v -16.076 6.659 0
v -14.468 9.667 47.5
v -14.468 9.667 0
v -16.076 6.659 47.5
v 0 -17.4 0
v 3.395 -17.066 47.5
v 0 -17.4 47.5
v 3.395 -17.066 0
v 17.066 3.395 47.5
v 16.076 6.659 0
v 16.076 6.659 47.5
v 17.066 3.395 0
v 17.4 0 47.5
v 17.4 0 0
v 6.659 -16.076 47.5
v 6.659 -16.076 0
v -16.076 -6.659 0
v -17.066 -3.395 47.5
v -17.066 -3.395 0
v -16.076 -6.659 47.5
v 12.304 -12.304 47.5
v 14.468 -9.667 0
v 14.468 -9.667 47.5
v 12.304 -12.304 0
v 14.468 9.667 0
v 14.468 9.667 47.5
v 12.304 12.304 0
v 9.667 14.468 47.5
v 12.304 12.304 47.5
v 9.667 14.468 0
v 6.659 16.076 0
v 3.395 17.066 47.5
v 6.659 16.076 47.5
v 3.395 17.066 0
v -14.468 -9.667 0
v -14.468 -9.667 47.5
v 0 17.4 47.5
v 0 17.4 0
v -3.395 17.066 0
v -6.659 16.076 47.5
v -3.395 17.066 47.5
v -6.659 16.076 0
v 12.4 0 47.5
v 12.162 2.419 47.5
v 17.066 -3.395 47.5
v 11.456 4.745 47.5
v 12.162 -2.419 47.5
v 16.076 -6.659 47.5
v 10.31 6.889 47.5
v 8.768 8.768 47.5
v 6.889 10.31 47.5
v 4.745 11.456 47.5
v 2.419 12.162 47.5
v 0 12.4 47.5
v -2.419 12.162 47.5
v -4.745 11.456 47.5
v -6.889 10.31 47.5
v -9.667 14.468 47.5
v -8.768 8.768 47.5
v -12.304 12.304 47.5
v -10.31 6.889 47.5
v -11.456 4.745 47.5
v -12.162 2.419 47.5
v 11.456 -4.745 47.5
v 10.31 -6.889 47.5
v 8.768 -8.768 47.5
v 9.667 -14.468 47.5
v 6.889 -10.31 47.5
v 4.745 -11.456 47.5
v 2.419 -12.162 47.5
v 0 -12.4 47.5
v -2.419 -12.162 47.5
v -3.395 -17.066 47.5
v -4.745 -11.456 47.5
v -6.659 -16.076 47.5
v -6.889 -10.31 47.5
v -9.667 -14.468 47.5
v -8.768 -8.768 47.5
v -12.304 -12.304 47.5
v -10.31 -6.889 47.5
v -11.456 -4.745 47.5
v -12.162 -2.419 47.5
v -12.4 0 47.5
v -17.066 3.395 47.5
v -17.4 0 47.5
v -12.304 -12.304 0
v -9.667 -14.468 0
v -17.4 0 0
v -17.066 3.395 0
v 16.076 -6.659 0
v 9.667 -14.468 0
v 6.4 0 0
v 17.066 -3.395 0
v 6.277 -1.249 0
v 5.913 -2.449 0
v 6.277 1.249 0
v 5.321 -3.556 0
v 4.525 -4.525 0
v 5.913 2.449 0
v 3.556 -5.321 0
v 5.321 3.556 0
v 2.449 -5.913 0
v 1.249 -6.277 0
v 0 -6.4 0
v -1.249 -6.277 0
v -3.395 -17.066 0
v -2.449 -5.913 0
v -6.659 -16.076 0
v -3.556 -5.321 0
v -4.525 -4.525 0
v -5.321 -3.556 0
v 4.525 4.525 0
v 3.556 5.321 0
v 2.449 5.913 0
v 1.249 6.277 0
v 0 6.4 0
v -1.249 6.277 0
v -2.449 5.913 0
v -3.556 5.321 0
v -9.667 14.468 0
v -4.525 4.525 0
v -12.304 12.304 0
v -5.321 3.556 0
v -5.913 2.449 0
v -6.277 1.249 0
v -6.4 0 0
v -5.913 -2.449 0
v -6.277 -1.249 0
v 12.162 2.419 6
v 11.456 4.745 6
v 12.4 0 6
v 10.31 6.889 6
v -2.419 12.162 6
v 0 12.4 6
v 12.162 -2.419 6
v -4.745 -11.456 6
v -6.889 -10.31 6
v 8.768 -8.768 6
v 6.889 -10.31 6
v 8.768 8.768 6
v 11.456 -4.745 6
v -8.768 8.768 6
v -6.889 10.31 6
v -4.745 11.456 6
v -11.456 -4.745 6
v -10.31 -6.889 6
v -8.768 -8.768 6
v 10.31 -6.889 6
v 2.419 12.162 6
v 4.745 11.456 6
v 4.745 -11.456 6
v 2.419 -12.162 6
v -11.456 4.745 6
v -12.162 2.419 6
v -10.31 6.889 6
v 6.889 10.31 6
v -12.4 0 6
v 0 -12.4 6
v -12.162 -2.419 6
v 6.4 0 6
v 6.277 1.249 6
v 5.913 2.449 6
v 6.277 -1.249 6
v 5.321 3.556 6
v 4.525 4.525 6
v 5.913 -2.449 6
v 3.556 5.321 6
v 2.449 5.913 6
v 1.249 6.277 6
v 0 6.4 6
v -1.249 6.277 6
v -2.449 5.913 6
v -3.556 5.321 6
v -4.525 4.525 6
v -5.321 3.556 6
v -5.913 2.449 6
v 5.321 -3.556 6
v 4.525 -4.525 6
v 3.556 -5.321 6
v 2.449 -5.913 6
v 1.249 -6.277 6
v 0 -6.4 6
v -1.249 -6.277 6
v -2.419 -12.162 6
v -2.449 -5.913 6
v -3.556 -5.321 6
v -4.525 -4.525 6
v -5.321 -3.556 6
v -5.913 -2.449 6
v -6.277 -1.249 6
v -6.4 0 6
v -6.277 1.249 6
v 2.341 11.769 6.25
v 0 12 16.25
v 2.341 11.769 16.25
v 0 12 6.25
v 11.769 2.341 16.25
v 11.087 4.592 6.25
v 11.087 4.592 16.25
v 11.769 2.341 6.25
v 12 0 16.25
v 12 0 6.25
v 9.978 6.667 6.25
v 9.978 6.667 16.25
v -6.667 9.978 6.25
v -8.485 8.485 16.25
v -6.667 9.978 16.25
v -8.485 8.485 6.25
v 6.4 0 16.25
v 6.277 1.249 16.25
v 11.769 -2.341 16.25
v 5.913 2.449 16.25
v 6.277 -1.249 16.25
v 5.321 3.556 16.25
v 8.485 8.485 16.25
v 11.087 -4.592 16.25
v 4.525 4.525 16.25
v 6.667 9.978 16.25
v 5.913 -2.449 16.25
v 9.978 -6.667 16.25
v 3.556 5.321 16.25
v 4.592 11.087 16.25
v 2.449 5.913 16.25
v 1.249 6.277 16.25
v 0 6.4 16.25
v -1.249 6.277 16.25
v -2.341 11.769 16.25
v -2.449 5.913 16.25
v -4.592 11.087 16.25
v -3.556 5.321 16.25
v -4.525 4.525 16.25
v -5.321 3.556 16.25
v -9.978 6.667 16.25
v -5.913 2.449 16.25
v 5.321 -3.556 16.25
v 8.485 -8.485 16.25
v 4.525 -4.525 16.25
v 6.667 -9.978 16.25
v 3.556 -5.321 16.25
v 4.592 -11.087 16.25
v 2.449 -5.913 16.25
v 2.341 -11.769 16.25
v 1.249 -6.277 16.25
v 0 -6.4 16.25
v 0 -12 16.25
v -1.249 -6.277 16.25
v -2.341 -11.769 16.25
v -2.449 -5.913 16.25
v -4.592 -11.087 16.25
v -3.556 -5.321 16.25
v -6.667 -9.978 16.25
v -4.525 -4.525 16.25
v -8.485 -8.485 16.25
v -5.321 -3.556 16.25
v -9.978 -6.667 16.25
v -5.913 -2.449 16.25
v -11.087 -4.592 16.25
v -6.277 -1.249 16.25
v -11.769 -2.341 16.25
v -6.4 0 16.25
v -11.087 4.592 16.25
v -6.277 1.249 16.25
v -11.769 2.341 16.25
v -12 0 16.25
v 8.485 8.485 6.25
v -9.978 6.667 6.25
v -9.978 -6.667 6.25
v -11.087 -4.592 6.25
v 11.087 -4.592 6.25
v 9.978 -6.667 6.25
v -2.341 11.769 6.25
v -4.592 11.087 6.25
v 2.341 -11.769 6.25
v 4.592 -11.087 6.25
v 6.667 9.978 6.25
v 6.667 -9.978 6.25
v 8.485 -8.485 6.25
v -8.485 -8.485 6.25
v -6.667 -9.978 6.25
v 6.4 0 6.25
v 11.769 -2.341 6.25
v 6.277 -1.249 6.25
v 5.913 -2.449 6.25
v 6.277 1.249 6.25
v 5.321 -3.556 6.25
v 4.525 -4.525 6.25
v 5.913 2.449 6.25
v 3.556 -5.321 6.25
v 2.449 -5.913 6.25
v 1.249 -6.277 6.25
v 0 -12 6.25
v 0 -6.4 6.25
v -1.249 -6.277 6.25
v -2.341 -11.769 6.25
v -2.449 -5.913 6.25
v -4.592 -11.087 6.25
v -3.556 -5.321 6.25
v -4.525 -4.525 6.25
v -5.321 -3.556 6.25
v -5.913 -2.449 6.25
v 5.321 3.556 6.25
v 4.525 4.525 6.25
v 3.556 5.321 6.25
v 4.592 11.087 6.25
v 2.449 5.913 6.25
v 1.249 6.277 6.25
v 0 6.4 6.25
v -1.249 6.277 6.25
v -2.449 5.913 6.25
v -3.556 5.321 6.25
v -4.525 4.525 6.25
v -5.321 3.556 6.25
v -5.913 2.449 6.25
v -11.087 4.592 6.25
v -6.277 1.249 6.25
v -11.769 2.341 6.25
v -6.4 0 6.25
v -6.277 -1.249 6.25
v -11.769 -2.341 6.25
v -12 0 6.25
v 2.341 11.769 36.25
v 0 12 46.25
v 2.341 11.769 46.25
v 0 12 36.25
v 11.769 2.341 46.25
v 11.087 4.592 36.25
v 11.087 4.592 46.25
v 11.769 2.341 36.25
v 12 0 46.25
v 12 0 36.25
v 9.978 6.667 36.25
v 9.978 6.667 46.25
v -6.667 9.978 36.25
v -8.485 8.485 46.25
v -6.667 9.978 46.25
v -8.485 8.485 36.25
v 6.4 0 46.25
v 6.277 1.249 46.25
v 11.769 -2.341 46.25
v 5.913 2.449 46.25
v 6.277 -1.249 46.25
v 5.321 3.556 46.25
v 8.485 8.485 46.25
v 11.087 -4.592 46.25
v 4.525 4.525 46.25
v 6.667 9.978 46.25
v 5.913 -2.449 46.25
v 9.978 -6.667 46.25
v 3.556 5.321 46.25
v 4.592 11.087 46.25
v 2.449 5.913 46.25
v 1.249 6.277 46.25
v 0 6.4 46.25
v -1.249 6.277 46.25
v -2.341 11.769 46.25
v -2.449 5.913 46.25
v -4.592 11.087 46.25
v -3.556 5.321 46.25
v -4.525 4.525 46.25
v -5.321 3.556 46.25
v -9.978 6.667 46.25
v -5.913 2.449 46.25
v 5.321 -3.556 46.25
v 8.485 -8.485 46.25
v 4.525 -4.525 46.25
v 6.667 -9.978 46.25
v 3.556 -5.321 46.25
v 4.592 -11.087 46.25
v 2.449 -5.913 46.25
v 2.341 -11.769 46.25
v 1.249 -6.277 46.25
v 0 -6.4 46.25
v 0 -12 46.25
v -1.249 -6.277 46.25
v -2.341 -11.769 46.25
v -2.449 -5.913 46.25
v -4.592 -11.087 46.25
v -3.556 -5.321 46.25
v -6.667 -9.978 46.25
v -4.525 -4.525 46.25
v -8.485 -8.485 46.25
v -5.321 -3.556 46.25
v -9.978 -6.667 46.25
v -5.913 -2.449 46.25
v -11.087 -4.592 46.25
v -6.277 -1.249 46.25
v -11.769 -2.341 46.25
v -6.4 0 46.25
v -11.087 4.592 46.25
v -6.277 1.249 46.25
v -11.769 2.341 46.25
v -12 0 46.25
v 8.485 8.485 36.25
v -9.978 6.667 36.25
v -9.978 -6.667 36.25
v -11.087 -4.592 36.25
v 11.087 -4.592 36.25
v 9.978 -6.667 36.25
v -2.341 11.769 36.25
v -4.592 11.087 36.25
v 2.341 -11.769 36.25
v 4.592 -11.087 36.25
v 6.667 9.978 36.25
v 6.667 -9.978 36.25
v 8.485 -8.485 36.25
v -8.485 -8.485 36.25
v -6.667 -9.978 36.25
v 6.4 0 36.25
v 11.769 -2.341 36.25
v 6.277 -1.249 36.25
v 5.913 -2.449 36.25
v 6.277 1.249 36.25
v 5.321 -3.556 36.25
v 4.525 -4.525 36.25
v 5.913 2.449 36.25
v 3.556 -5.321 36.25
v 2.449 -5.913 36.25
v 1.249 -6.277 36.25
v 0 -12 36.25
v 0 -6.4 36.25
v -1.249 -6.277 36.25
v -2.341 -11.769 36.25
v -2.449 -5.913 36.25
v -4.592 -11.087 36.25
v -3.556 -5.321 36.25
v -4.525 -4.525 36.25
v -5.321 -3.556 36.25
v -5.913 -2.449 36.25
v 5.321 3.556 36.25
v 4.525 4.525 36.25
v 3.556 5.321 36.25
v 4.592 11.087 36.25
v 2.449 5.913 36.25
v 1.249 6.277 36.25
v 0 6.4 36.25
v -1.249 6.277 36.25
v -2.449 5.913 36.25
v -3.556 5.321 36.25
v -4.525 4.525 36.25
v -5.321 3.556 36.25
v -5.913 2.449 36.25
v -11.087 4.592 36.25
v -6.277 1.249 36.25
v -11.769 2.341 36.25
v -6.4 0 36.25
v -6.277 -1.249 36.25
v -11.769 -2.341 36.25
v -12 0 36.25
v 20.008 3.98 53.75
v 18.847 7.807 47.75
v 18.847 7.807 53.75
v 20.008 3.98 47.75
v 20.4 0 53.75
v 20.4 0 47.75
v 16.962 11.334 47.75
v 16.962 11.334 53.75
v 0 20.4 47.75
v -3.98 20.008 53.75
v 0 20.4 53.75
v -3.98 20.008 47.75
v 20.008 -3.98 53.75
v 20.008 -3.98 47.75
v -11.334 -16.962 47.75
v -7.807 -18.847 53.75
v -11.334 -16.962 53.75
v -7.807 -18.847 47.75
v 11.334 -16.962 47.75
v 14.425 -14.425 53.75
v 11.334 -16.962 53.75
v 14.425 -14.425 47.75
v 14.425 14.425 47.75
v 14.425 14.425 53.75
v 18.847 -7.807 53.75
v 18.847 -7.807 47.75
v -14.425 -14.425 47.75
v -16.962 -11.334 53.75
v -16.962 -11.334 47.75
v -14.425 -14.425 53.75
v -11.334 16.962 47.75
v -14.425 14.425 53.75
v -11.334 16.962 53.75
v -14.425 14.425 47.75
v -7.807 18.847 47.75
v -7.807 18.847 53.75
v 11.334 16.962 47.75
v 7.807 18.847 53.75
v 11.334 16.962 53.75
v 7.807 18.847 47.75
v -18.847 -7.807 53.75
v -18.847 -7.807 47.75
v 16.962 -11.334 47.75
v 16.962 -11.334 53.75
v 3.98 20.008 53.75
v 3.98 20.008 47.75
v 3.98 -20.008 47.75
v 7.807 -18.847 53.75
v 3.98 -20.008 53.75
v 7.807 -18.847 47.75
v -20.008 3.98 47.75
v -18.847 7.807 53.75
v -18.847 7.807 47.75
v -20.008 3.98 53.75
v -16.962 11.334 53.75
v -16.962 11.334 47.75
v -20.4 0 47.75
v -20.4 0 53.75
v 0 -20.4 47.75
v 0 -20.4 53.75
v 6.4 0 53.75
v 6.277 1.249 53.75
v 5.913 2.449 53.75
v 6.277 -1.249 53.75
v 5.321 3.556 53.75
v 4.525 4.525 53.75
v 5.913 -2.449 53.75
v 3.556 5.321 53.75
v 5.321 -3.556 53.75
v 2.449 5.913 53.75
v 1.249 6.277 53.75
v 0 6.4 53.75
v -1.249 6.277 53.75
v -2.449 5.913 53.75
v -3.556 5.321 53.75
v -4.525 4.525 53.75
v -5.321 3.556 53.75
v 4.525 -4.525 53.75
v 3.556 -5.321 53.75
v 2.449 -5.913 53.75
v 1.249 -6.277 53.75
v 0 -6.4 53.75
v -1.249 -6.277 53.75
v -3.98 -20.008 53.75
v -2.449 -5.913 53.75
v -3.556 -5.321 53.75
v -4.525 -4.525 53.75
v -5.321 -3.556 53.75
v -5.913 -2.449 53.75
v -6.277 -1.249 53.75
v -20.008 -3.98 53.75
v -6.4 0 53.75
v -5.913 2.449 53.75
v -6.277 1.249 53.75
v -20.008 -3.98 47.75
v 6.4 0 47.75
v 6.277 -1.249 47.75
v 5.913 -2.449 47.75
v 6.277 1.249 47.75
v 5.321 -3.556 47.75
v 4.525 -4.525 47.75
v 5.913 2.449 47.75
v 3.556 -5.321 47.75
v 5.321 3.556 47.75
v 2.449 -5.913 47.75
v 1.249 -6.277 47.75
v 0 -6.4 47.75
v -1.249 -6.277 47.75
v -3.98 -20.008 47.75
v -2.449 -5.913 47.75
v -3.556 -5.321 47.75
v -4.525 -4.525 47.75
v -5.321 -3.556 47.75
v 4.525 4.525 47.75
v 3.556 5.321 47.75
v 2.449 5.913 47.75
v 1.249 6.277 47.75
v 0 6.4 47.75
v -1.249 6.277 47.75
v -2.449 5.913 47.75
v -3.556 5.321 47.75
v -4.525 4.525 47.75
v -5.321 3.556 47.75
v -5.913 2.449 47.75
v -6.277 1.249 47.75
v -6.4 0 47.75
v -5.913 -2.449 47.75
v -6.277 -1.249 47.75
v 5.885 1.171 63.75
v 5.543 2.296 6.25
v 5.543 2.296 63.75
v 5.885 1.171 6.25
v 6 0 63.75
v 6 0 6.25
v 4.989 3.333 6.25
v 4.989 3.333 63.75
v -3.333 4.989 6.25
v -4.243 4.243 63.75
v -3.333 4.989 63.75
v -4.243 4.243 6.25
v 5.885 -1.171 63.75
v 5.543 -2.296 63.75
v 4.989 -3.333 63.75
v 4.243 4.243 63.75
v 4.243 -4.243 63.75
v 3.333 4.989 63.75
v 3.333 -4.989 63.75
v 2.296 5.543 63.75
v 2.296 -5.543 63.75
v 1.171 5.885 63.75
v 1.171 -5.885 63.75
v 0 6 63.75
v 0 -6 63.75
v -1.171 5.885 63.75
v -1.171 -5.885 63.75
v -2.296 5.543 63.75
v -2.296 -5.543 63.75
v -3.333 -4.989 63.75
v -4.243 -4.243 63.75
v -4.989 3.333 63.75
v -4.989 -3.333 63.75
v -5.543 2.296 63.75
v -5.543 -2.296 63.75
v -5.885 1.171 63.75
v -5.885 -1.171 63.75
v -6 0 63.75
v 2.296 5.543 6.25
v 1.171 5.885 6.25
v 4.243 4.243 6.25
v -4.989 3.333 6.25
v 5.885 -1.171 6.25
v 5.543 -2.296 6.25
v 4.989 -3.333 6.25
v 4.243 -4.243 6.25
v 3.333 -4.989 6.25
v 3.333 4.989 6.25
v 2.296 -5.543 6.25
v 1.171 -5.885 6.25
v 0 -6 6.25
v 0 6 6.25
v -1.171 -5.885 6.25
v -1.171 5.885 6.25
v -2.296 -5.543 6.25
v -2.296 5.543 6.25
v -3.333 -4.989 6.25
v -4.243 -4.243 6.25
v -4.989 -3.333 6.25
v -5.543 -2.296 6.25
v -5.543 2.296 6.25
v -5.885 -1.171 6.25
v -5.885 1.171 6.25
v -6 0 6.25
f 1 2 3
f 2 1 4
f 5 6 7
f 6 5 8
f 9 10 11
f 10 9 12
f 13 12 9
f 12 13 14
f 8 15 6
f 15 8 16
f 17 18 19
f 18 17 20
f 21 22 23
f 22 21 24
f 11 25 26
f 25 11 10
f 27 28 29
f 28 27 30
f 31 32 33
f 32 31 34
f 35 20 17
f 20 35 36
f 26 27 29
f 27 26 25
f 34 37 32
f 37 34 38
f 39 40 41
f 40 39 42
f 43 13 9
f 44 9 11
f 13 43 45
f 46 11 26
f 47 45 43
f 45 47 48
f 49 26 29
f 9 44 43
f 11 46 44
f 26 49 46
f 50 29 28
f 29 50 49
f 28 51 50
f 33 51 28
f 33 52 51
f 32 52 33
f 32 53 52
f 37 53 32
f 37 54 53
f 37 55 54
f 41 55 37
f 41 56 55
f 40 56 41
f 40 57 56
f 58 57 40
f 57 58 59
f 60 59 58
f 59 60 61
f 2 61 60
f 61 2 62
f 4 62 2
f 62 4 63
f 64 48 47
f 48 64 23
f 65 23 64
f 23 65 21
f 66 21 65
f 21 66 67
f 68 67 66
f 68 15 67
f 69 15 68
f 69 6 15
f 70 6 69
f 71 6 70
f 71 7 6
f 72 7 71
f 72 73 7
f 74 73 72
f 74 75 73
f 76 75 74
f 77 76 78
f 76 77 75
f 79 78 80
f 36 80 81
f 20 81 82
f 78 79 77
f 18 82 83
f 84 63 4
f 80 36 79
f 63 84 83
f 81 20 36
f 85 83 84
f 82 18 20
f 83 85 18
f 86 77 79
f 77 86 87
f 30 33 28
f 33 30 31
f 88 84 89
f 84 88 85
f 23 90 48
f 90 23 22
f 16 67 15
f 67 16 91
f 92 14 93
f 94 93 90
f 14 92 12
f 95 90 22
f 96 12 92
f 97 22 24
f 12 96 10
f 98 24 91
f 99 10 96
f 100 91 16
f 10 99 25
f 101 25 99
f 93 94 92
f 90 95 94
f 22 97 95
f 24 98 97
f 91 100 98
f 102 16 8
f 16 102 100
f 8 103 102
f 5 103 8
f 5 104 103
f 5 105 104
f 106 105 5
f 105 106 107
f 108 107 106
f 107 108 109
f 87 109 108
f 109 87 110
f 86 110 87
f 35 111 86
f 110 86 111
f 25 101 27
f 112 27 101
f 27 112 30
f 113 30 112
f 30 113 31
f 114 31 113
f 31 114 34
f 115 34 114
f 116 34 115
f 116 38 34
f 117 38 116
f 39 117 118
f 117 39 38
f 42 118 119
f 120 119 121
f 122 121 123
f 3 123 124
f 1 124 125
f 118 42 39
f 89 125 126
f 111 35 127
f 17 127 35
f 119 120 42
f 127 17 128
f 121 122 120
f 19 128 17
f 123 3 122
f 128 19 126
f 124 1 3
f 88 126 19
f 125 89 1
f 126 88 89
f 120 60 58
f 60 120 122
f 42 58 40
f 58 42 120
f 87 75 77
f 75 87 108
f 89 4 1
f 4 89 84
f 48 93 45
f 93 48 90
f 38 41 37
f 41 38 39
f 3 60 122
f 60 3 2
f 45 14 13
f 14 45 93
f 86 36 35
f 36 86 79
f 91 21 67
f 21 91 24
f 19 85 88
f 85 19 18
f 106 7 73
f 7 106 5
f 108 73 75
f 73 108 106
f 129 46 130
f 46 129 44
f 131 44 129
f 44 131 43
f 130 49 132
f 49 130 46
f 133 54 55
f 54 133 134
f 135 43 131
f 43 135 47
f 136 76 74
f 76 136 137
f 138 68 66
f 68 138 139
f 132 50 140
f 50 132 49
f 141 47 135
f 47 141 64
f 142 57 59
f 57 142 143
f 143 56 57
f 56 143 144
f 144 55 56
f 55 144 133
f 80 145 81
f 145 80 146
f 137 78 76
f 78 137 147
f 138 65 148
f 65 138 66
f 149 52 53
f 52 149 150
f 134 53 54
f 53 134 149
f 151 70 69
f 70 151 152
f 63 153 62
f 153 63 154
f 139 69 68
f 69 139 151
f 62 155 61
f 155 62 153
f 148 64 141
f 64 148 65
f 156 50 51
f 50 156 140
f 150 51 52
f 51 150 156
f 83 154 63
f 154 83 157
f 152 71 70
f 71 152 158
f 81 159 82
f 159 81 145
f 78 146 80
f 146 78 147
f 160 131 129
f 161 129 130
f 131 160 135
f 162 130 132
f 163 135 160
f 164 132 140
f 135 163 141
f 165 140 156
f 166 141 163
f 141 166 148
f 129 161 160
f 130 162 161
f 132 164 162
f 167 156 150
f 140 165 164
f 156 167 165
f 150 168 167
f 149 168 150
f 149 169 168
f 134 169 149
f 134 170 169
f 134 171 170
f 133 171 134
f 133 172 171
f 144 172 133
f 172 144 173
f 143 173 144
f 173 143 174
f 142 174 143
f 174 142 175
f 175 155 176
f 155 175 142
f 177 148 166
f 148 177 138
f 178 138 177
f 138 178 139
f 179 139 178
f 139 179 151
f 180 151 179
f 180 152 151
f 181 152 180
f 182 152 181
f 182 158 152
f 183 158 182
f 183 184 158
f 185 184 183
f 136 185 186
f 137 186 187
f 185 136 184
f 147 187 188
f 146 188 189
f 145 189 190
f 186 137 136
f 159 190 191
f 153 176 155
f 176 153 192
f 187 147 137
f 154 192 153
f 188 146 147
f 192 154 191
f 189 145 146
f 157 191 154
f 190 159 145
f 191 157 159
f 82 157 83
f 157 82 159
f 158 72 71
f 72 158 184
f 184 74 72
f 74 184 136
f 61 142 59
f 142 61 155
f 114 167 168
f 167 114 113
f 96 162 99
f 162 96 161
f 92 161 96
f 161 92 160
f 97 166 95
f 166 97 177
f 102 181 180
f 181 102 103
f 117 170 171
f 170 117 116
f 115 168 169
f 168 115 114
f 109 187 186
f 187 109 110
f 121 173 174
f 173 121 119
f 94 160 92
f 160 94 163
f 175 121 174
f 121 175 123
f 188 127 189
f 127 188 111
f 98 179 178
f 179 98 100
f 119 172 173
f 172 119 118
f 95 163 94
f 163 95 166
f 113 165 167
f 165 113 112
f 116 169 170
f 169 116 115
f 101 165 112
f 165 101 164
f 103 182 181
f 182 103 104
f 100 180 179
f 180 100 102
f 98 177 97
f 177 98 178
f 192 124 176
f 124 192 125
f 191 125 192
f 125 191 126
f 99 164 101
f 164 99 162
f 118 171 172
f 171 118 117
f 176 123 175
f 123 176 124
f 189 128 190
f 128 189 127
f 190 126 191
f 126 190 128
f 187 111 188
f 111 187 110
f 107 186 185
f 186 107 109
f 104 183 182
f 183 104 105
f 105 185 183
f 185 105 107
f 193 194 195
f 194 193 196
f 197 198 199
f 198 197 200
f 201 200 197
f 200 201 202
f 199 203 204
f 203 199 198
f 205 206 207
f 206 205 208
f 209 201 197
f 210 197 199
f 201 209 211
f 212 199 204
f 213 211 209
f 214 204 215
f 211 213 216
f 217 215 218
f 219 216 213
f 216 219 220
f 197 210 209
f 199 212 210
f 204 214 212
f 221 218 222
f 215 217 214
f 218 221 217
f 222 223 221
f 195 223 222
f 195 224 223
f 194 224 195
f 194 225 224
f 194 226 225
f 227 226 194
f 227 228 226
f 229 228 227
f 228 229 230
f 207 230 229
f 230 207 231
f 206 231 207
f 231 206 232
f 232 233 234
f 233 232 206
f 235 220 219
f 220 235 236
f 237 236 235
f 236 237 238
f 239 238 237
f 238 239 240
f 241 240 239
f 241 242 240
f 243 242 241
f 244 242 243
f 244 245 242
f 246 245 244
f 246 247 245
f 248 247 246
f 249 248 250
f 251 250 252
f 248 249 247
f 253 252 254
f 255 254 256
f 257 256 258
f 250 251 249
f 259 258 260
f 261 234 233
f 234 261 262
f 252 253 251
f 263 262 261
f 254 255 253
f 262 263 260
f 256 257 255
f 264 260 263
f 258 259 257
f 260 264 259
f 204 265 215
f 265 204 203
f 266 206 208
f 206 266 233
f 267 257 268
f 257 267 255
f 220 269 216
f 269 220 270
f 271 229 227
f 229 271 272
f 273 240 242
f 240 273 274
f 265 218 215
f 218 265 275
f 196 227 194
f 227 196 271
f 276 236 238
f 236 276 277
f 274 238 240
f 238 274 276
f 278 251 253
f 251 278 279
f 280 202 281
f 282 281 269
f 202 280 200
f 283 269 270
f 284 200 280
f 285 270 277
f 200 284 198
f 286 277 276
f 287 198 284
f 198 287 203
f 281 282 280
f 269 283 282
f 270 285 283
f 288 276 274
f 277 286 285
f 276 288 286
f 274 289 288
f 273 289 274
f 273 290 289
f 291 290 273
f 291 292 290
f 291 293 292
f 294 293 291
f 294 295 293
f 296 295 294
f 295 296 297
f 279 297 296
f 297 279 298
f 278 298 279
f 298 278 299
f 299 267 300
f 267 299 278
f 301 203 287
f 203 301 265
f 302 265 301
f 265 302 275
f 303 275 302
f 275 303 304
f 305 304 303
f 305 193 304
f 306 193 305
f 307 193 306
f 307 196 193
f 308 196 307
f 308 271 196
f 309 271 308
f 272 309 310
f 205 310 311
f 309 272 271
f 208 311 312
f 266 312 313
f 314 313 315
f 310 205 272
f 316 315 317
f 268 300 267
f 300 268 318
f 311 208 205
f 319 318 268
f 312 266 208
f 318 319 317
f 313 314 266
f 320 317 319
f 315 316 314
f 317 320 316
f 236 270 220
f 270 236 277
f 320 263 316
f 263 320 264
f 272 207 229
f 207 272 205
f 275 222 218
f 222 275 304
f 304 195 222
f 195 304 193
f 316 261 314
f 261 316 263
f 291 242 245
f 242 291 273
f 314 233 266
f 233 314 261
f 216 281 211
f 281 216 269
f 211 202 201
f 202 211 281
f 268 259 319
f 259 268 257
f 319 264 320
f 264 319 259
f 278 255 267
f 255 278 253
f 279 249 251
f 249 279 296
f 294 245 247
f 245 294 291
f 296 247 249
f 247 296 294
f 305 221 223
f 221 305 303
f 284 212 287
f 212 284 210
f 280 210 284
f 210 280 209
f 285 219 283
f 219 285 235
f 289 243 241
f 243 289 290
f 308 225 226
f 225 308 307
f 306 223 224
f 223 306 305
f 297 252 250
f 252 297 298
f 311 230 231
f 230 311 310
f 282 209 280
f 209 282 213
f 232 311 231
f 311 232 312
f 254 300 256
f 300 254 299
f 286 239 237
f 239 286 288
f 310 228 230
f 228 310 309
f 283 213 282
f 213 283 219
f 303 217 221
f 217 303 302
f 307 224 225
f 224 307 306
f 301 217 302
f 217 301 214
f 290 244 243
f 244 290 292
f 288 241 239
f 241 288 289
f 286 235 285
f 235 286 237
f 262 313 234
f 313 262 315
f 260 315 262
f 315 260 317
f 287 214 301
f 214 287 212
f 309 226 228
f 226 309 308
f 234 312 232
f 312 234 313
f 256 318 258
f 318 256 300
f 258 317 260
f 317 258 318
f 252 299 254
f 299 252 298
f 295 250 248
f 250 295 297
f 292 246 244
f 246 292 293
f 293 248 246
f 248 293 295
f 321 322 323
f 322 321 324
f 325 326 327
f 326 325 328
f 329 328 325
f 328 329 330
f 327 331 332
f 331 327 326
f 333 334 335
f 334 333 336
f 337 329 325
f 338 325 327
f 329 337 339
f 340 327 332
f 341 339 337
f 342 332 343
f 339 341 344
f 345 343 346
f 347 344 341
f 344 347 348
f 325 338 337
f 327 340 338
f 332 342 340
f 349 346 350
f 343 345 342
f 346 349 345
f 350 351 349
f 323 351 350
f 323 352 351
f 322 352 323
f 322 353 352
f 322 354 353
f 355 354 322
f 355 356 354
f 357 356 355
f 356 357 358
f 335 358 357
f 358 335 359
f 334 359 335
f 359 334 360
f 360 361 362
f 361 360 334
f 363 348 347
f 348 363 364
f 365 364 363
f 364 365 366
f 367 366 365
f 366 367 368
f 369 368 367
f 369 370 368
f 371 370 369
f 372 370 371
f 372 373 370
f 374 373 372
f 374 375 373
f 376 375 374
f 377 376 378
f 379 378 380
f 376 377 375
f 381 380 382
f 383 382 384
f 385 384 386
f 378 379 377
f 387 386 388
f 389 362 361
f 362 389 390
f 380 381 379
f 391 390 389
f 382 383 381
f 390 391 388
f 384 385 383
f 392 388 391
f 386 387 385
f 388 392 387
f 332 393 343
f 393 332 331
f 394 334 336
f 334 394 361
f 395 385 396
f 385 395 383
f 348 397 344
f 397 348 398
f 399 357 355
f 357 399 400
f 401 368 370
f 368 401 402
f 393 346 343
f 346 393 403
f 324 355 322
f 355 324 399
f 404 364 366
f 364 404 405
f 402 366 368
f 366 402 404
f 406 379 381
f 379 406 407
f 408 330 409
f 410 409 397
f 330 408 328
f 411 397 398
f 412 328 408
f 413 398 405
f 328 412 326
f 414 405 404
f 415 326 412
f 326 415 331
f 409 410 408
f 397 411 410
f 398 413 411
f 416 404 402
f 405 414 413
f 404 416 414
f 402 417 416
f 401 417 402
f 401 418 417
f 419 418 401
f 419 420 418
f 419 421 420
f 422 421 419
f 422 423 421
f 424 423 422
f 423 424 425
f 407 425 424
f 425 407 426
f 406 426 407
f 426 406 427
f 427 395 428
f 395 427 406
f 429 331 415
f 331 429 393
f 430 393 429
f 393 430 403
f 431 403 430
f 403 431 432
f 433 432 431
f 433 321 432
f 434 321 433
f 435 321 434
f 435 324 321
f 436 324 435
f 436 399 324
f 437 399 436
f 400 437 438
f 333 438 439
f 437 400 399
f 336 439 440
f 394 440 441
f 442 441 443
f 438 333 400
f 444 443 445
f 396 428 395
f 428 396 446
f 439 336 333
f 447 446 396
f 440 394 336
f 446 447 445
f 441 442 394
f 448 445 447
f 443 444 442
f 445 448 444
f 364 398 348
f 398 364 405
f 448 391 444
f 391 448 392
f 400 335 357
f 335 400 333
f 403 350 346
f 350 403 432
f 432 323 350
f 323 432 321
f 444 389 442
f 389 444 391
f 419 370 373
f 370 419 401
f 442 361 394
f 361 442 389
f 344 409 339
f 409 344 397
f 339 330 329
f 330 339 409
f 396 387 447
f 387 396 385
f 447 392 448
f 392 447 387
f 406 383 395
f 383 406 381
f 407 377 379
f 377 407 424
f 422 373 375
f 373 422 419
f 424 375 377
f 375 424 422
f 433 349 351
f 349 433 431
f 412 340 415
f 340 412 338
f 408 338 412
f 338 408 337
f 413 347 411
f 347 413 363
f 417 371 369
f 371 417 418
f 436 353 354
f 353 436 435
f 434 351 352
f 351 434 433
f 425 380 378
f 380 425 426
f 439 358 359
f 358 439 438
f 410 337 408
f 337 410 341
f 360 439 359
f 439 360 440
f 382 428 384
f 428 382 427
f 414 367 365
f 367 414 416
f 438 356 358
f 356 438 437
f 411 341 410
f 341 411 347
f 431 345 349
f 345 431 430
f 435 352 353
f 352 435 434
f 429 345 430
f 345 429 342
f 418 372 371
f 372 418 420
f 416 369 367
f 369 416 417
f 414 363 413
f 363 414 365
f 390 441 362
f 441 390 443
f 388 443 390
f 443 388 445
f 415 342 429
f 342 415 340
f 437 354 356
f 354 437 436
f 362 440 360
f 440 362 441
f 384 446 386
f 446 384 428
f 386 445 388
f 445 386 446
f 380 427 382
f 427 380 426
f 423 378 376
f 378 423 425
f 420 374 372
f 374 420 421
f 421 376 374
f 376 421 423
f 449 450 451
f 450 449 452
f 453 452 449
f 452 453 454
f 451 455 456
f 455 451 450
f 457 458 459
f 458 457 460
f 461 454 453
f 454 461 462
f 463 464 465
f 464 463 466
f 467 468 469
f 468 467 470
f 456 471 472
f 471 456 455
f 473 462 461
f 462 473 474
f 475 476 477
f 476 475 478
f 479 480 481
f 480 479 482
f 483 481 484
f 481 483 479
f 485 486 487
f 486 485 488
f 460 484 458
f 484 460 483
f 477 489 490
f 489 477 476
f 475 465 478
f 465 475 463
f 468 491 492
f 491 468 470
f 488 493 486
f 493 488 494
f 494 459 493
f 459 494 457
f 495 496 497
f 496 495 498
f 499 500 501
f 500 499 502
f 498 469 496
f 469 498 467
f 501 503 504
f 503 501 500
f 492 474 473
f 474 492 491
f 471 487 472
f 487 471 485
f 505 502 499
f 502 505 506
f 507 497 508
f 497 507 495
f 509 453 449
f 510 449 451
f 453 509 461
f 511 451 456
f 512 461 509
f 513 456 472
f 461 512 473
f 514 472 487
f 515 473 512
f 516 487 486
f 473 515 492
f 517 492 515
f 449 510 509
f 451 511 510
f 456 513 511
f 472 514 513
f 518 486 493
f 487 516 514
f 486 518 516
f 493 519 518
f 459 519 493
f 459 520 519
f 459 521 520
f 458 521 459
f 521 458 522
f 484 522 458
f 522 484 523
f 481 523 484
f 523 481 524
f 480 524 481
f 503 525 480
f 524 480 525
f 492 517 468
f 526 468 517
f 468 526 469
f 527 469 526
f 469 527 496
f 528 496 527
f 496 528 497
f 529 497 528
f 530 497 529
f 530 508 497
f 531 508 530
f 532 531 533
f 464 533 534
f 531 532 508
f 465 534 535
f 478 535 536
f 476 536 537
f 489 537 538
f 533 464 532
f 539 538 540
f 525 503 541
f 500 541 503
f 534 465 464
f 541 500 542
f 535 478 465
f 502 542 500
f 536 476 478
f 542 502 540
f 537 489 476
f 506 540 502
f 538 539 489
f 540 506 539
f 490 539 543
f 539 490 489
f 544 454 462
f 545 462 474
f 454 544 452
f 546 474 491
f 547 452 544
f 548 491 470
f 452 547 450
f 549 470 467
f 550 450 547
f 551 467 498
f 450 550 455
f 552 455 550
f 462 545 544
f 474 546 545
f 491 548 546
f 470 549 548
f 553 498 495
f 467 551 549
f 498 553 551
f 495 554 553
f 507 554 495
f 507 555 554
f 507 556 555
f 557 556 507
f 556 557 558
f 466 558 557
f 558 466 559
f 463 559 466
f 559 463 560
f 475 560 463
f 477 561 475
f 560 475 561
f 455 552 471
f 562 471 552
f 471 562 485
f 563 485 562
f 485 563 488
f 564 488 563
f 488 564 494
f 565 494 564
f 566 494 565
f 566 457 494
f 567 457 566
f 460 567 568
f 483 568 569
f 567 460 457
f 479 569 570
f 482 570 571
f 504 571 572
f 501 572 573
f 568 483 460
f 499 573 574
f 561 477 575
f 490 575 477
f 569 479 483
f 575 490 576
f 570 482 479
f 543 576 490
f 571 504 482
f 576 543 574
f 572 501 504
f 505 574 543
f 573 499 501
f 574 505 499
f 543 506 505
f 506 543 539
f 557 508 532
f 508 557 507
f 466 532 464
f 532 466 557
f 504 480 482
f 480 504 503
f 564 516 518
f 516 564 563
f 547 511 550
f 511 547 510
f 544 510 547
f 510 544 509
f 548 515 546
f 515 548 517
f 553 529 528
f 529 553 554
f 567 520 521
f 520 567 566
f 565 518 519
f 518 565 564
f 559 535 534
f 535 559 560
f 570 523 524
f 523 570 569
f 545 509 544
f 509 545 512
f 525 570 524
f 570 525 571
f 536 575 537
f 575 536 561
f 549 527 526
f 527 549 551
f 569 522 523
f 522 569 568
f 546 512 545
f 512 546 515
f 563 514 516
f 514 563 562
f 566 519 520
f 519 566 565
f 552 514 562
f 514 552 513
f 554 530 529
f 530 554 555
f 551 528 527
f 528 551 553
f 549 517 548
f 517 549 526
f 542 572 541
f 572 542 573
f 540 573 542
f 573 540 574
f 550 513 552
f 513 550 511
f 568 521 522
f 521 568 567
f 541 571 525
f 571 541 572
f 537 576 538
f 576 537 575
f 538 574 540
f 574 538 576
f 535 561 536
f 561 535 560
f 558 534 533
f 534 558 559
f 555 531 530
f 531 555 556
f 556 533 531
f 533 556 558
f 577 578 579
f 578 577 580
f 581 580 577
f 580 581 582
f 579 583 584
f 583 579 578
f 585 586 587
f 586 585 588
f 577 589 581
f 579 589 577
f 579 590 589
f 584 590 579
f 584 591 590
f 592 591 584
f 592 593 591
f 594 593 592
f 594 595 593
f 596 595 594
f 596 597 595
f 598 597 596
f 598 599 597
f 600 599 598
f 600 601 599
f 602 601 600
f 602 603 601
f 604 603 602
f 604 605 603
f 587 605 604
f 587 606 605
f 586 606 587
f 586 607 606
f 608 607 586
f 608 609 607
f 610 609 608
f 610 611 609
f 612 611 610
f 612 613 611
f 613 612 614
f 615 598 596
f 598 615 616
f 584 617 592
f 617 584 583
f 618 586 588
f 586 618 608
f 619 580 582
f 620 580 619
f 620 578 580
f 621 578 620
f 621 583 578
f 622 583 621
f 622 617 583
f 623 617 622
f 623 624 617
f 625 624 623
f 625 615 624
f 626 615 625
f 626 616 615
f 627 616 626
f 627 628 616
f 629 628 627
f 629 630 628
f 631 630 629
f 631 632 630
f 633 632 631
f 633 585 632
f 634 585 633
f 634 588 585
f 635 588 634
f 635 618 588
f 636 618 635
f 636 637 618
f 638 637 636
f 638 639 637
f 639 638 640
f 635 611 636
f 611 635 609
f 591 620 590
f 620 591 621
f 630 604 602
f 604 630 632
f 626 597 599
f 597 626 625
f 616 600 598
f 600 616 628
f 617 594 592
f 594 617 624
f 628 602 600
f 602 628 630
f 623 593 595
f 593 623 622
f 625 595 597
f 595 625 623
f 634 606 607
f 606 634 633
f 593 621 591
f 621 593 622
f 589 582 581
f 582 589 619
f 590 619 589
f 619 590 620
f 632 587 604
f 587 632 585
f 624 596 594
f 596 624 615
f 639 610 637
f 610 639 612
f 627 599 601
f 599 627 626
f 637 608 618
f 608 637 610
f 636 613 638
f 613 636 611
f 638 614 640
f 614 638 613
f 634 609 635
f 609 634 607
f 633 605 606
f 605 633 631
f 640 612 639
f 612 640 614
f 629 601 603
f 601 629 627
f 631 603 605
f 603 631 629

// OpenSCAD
$fn = 32;

// ------------------------------------------------------------------------
// Shaft station: cup d34.8 x 47.5 mm, shaft d12
// Every part is its own module, assembly() places every instance.
// ------------------------------------------------------------------------

// --- part 1 ---
module housing_cup() {
  difference() {
    cylinder(h = 47.5, d = 34.8);
    translate([0, 0, 6]) cylinder(h = 42.5, d = 24.8);
    translate([0, 0, -1]) cylinder(h = 8, d = 12.8);
  }
}

// --- part 2 ---
module bearing_lower() {
  difference() {
      translate([0, 0, 0]) cylinder(h = 10, d = 24);
      translate([0, 0, -1]) cylinder(h = 12, d = 12.8);
    }
}

// --- part 3 ---
module bearing_upper() {
  difference() {
      translate([0, 0, 0]) cylinder(h = 10, d = 24);
      translate([0, 0, -1]) cylinder(h = 12, d = 12.8);
    }
}

// --- part 4 ---
module station_shaft() {
  translate([0, 0, -28.75]) cylinder(h = 57.5, d = 12);
}

// --- part 5 ---
module station_cover() {
  difference() {
    cylinder(h = 6, d = 40.8);
    translate([0, 0, -1]) cylinder(h = 8, d = 12.8);
  }
}

// --- assembly ---
module assembly() {
  color([0.80, 0.24, 0.20]) translate([0, 0, 0]) rotate([0, 0, 0]) housing_cup();
  color([0.20, 0.45, 0.75]) translate([0, 0, 6.25]) rotate([0, 0, 0]) bearing_lower();
  color([0.25, 0.62, 0.32]) translate([0, 0, 36.25]) rotate([0, 0, 0]) bearing_upper();
  color([0.92, 0.70, 0.18]) translate([0, 0, 35]) rotate([0, 0, 0]) station_shaft();
  color([0.58, 0.35, 0.70]) translate([0, 0, 47.75]) rotate([0, 0, 0]) station_cover();
}

assembly();
